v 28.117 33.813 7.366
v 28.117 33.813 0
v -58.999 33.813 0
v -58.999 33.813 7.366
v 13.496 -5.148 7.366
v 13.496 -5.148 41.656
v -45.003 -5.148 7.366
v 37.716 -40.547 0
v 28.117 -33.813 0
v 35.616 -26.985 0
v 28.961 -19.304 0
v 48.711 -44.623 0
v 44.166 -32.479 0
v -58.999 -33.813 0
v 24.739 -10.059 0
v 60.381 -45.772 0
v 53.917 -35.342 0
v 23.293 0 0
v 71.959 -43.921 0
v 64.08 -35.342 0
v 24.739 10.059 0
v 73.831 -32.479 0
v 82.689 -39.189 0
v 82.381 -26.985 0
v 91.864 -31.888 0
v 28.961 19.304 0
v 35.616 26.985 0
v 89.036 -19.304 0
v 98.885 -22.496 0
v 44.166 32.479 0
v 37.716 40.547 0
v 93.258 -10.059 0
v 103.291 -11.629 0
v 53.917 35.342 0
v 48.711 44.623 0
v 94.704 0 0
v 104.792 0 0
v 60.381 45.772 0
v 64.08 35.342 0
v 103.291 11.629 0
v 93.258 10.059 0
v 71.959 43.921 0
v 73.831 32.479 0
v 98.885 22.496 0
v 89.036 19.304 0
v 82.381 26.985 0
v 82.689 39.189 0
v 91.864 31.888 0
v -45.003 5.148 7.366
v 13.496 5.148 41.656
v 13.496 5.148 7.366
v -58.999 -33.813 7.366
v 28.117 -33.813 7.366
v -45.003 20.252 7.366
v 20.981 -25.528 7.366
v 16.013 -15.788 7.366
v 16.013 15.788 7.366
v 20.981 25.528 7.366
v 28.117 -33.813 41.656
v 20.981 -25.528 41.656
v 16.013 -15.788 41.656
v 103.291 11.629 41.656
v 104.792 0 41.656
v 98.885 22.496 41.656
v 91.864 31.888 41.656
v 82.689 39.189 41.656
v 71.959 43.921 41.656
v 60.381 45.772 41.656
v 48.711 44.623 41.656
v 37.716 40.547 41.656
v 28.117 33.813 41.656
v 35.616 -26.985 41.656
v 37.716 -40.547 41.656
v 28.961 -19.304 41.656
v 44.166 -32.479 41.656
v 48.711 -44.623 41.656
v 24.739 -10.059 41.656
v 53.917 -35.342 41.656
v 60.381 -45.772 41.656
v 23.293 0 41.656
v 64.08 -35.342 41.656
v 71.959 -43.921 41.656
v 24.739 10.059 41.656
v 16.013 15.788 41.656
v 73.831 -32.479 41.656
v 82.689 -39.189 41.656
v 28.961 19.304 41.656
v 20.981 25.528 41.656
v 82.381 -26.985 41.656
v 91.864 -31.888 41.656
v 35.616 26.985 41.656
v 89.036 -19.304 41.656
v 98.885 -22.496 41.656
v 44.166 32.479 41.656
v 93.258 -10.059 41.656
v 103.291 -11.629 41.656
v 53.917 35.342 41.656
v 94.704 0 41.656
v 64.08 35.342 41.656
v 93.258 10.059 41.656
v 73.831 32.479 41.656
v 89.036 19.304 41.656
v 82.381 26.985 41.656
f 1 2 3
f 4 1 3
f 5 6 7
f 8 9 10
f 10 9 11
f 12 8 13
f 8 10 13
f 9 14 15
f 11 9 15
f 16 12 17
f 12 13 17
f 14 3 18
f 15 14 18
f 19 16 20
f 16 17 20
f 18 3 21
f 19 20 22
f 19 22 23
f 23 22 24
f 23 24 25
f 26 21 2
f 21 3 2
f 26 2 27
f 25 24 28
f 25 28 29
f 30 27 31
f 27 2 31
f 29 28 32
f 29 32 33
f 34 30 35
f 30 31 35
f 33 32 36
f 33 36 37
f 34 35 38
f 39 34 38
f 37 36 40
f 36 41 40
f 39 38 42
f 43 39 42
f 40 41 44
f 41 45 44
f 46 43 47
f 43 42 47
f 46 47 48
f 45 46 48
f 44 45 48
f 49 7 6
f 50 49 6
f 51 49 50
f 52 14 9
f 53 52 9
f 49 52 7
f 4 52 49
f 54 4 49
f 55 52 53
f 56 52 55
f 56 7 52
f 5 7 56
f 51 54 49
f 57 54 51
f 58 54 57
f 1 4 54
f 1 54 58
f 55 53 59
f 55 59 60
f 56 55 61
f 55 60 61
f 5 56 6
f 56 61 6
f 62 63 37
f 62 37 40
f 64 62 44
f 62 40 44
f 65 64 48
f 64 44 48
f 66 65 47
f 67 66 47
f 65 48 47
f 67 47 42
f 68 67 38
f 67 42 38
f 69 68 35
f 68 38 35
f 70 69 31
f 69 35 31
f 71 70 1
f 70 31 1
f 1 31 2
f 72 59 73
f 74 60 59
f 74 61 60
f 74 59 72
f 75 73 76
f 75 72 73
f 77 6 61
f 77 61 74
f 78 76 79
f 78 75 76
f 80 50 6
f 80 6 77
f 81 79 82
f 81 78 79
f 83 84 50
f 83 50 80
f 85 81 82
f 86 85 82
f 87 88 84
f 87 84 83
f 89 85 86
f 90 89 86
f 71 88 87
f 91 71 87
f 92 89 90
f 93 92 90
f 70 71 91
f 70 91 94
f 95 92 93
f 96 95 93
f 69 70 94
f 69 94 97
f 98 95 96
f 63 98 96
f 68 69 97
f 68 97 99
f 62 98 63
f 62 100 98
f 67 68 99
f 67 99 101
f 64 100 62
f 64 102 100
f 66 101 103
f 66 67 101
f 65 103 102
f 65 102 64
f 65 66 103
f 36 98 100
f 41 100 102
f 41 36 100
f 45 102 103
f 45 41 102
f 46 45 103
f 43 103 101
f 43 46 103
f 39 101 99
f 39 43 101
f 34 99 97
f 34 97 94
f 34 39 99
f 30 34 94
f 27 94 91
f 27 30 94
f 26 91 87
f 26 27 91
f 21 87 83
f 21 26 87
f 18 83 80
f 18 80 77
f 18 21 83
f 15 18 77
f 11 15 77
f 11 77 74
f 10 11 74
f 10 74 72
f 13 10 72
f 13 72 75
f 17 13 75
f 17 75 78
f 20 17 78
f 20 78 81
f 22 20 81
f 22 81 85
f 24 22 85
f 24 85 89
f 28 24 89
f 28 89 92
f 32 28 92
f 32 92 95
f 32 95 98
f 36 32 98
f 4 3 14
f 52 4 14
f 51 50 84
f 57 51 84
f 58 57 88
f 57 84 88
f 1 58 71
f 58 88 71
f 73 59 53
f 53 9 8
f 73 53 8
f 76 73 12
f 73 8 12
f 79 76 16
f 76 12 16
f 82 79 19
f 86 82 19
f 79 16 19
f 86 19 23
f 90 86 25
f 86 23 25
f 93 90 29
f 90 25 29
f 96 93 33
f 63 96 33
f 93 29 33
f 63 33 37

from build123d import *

# Parameters (mm, degrees)
F0_R     = 35.7057277328
F1_DEPTH = 41.656
F2_R     = 35.7057277328
F3_DEPTH = 34.29
F5_DEPTH = 25.4


with BuildPart() as f1:
    # F0 (on Top) → F1 (new body)
    with BuildSketch(Plane.XY):
        with BuildLine():
            Line((28.1166336854, 33.8129214942), (-58.9986741543, 33.8129214942))
            Line((-58.9986741543, 33.8129214942), (-58.9986741543, -33.8129214942))
            Line((-58.9986741543, -33.8129214942), (28.1166336854, -33.8129214942))
            ThreePointArc((28.1166336854, -33.8129214942), (13.2055078137, 0), (28.1166336854, 33.8129214942))
        make_face()
        with BuildLine():
            ThreePointArc((104.7918404949, 0), (77.4760612446, 41.8998836492), (28.1166336854, 33.8129214942))
            ThreePointArc((28.1166336854, 33.8129214942), (13.2055078137, 0), (28.1166336854, -33.8129214942))
            ThreePointArc((28.1166336854, -33.8129214942), (77.4760612446, -41.8998836492), (104.7918404949, 0))
        make_face()
        with Locations((58.9986741543, 0)):
            Circle(F0_R, mode=Mode.SUBTRACT)
    extrude(amount=F1_DEPTH)

    # F2 (on face) → F3 (cut)
    with BuildSketch(Plane.XY.offset(41.656)):
        with Locations((58.9986741543, 0)):
            Circle(F2_R)
        with BuildLine():
            ThreePointArc((13.4958462684, 5.1484694704), (18.2056020605, 20.8071947328), (28.1166336854, 33.8129214942))
            Line((28.1166336854, 33.8129214942), (-58.9986741543, 33.8129214942))
            Line((-58.9986741543, 33.8129214942), (-58.9986741543, -33.8129214942))
            Line((-58.9986741543, -33.8129214942), (28.1166336854, -33.8129214942))
            ThreePointArc((28.1166336854, -33.8129214942), (18.2056020605, -20.8071947328), (13.4958462684, -5.1484694704))
            Line((13.4958462684, -5.1484694704), (-45.0028181076, -5.1484694704))
            Line((-45.0028181076, -5.1484694704), (-45.0028181076, 5.1484694704))
            Line((-45.0028181076, 5.1484694704), (13.4958462684, 5.1484694704))
        make_face()
    extrude(amount=-F3_DEPTH, mode=Mode.SUBTRACT)

    # F4 (on face) → F5 (cut)
    with BuildSketch(Plane.XZ.offset(5.1484694704)):
        Polygon((-45.0028181076, 7.366), (13.4958462684, 41.656), (-45.0028181076, 41.656), align=None)
    extrude(amount=-F5_DEPTH, mode=Mode.SUBTRACT)


solid = f1.part
